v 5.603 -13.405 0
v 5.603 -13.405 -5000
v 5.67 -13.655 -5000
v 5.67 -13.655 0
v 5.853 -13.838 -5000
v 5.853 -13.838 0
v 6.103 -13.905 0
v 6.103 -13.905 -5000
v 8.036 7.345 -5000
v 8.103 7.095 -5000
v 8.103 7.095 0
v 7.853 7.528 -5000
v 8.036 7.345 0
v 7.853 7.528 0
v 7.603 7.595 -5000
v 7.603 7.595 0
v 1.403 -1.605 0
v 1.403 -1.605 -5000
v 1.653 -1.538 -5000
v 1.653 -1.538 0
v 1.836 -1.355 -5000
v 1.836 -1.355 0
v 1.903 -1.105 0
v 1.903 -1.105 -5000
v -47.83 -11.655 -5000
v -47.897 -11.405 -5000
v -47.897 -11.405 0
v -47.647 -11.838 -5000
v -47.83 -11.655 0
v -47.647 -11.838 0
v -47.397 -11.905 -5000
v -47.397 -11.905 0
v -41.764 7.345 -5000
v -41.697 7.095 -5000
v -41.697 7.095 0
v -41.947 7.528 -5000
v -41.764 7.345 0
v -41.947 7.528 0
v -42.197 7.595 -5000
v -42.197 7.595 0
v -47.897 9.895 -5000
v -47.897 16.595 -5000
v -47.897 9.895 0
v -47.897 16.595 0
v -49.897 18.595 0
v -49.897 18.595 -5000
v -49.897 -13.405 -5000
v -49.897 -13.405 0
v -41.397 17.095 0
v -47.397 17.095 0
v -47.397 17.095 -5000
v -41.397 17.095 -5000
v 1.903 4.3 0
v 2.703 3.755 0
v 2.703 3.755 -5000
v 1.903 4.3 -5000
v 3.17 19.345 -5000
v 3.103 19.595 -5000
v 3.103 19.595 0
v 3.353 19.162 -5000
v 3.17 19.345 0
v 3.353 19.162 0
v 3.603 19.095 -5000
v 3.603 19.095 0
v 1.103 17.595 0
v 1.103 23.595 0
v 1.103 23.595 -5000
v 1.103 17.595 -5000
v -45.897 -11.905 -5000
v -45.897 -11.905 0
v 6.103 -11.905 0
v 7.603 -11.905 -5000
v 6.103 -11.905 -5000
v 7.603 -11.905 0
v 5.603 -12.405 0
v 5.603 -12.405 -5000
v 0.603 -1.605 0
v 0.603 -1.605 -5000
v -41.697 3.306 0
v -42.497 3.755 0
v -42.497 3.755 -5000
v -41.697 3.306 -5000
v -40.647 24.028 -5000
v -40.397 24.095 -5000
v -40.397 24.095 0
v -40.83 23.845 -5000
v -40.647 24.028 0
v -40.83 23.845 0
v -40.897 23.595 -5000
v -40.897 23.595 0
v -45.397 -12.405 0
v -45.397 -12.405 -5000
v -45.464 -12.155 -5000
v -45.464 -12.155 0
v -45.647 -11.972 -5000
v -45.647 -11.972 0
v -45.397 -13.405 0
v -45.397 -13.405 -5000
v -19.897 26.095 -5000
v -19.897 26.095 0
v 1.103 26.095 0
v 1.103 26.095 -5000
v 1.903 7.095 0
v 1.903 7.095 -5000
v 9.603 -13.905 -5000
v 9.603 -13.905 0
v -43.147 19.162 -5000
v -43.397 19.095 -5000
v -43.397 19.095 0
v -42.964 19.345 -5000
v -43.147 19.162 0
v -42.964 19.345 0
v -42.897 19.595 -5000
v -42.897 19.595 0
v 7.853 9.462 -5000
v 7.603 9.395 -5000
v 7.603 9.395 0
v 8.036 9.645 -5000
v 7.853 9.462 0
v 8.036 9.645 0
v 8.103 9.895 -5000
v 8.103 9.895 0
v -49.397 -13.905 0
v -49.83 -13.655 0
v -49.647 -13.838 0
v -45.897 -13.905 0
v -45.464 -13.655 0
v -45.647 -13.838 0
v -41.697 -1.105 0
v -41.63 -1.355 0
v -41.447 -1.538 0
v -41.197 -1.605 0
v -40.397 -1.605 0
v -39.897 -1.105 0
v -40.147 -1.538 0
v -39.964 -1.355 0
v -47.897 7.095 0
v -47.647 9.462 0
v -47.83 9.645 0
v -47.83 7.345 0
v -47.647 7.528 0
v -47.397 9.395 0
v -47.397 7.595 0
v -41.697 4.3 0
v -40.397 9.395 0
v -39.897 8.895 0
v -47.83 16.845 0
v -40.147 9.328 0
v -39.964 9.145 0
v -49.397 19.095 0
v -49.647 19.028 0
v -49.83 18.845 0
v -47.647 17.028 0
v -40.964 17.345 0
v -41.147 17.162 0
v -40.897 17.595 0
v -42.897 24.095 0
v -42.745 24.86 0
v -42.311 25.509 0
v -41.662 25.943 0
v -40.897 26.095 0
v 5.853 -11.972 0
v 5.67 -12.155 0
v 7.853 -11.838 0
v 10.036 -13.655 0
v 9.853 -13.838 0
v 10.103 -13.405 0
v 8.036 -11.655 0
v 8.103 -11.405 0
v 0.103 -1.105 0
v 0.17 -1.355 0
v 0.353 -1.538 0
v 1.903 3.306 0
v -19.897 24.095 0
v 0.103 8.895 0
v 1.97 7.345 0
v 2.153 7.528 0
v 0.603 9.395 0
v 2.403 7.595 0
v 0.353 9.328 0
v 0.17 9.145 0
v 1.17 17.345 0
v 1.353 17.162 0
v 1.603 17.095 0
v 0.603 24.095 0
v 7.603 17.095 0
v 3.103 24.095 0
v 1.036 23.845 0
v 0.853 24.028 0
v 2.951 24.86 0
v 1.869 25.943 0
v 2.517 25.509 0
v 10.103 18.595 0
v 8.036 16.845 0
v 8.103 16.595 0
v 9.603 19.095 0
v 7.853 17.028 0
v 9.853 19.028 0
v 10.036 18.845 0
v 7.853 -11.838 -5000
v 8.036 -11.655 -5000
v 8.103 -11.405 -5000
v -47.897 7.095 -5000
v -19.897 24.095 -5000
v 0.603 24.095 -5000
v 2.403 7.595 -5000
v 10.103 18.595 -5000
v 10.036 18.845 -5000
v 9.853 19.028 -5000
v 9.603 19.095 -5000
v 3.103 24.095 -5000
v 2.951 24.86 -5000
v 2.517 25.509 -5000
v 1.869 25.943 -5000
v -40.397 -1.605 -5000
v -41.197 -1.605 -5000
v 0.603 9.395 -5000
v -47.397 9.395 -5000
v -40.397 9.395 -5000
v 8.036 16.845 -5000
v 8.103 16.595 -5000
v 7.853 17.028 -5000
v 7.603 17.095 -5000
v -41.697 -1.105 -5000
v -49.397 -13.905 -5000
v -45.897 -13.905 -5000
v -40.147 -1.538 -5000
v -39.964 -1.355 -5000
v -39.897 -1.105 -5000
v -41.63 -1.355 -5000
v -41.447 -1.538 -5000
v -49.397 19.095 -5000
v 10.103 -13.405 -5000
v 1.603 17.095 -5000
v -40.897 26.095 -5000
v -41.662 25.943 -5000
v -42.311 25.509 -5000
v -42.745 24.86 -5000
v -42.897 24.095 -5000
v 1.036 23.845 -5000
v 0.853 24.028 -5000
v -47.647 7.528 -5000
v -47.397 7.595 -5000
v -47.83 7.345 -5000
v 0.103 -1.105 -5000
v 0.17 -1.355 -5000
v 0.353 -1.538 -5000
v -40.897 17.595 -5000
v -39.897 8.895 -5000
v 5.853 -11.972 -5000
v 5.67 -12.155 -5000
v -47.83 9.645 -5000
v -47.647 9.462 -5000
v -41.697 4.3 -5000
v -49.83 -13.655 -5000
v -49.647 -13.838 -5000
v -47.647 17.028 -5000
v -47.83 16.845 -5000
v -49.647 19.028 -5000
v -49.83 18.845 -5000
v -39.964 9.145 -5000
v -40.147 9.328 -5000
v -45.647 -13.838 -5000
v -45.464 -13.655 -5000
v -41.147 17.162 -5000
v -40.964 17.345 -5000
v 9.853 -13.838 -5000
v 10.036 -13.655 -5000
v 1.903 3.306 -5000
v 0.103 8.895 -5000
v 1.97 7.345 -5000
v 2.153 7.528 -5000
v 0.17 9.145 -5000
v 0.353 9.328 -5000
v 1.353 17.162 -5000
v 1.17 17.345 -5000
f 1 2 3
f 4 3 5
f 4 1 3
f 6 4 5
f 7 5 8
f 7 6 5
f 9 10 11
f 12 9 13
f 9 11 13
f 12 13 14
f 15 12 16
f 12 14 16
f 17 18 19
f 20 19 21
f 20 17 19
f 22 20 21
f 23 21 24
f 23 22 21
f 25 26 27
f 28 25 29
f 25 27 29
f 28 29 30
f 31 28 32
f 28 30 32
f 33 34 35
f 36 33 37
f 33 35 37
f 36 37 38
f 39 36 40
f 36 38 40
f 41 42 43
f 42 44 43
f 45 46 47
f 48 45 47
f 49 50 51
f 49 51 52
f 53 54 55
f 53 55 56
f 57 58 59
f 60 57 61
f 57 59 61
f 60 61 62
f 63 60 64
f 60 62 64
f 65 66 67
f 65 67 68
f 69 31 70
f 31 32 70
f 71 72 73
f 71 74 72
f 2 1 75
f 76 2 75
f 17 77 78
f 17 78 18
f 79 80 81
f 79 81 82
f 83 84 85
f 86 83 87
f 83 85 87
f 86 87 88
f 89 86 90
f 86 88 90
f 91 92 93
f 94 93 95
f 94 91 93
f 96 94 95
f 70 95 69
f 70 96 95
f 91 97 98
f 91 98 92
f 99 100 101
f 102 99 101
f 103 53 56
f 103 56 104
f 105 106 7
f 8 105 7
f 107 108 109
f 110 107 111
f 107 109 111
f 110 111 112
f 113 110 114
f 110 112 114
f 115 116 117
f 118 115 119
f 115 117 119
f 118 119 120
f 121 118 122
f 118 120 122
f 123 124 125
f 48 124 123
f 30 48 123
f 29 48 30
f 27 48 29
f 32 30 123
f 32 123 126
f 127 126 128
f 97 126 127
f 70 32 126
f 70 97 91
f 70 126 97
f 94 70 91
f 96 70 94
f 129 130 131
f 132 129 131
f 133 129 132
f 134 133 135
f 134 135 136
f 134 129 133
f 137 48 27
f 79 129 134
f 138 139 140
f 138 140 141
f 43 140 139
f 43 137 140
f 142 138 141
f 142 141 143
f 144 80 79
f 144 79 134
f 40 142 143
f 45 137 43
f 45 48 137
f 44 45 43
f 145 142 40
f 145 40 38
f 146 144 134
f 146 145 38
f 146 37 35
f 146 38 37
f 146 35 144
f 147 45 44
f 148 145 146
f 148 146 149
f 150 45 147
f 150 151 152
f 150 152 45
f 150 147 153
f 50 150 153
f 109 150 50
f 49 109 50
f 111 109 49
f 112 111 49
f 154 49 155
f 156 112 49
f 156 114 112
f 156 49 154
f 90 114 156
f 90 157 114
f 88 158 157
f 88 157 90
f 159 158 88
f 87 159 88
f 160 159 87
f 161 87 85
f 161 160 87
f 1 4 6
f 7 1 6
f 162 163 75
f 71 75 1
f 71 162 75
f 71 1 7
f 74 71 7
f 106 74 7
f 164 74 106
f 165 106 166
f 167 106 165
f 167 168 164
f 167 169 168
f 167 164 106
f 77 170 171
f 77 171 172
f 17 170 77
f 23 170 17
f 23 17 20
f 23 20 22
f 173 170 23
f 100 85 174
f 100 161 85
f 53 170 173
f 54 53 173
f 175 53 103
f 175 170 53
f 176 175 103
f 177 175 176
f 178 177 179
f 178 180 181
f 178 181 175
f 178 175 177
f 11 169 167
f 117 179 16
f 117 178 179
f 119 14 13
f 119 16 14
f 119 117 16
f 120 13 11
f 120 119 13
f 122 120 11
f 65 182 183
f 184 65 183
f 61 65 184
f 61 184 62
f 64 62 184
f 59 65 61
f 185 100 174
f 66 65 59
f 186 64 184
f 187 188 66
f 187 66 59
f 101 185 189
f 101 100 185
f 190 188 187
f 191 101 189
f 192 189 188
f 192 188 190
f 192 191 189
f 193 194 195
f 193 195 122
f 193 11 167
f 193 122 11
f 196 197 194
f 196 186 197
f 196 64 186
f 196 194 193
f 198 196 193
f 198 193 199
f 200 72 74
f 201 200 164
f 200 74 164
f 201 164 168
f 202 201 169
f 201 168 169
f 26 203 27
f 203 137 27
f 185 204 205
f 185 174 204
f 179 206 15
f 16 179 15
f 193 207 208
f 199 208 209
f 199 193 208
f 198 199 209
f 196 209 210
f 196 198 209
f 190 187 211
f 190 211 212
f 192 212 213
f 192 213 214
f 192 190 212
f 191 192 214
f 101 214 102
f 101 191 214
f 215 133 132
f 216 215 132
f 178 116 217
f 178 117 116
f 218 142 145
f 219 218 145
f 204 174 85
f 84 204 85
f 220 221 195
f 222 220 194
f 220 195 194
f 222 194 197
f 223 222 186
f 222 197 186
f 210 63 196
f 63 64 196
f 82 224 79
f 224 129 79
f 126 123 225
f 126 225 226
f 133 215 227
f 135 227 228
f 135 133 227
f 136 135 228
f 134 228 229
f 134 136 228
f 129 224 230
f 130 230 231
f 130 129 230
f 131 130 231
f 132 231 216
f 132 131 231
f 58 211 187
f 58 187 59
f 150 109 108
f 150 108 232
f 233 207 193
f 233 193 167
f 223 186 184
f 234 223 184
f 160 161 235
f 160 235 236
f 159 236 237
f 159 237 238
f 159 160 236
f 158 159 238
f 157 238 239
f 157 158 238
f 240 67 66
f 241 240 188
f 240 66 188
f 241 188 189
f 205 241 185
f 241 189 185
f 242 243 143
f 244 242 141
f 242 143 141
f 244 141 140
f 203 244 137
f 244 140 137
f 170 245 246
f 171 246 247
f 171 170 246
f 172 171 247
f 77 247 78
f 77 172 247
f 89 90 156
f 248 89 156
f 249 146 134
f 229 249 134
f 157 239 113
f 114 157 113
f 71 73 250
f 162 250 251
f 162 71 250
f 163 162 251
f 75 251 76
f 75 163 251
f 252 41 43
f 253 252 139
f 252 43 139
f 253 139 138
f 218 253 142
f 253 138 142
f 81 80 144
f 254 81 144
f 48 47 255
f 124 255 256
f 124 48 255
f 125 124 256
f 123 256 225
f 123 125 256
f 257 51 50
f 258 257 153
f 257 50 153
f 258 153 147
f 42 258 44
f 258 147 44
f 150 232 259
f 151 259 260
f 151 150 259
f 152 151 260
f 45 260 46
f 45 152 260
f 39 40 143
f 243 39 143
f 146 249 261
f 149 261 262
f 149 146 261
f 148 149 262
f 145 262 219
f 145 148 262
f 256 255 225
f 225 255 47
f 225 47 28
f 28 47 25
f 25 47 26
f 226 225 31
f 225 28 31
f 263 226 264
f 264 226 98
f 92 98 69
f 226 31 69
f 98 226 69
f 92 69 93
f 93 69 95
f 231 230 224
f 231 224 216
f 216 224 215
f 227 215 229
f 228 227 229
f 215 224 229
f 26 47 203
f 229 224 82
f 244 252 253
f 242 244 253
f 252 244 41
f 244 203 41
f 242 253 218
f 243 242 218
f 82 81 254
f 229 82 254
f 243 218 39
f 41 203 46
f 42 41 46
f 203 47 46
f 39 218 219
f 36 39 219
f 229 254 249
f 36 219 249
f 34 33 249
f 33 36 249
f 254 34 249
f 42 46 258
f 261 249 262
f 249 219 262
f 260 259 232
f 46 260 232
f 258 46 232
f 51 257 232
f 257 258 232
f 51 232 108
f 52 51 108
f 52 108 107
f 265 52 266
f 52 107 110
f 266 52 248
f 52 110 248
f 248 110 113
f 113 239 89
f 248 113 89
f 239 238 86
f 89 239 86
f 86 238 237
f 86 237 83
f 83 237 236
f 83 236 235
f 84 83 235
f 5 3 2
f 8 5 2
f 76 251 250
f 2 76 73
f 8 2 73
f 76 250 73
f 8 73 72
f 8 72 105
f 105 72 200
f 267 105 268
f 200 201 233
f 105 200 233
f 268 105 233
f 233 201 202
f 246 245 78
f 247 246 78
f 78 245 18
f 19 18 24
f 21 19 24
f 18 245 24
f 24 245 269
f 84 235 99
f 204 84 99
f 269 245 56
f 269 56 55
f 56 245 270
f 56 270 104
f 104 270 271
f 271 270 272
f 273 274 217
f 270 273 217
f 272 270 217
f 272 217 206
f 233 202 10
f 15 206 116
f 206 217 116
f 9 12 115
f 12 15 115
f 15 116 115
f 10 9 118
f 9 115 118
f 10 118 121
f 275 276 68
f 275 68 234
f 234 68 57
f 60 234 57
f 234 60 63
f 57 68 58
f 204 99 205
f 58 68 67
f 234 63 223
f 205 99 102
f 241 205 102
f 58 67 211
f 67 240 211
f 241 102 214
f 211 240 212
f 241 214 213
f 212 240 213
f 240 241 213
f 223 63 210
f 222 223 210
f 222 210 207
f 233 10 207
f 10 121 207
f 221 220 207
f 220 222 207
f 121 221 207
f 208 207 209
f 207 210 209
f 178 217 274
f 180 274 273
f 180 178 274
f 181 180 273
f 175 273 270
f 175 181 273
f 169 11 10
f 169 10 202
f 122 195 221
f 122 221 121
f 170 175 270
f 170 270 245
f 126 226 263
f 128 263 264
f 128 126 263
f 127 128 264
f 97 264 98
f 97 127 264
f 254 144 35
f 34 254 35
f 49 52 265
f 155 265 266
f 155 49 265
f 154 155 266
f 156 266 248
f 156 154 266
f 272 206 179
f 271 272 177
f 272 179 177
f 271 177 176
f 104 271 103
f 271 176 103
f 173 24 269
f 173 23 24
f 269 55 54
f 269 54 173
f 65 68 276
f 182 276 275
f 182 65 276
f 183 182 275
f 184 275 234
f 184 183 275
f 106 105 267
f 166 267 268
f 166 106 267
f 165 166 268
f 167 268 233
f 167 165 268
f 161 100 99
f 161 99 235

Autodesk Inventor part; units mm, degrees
ref_plane "YZ Plane" through (0, 0, 0) normal (1, 0, 0) x (0, 1, 0)
ref_plane "XZ Plane" through (0, 0, 0) normal (0, 1, 0) x (-1, 0, 0)
ref_plane "XY Plane" through (0, 0, 0) normal (0, 0, 1) x (1, 0, 0)
sketch "Sketch1" plane through (0, 0, 0) normal (0, 0, 1) x (1, 0, 0)
  line L0 (-19.8968, 26.095) -> (1.1032, 26.095)
  line L1 (10.1032, 18.595) -> (10.1032, -13.405)
  line L2 (9.6032, -13.905) -> (6.1032, -13.905)
  line L3 (-19.8968, 24.095) -> (0.6032, 24.095)
  line L4 (7.6032, -11.905) -> (6.1032, -11.905)
  line L5 (3.1032, 24.095) -> (3.1032, 19.595)
  line L6 (3.6032, 19.095) -> (9.6032, 19.095)
  line L7 (-19.8968, 31.6782) -> (-19.8968, -20.1233) construction
  line L8 (1.1032, 23.595) -> (1.1032, 17.595)
  line L9 (1.1032, 17.095) -> (1.1032, 17.095)
  line L10 (7.6032, 17.095) -> (1.6032, 17.095)
  line L11 (7.6032, 9.395) -> (0.6032, 9.395)
  line L12 (0.1032, 8.895) -> (0.1032, -1.105)
  line L13 (0.6032, -1.605) -> (1.4032, -1.605)
  line L14 (2.4032, 7.595) -> (7.6032, 7.595)
  line L15 (2.7032, 3.7552) -> (1.9032, 4.2999)
  line L16 (2.7032, 3.7552) -> (1.9032, 3.306)
  line L17 (1.9032, -1.105) -> (1.9032, 3.306)
  line L18 (1.9032, 4.2999) -> (1.9032, 7.095)
  line L19 (5.6032, -13.405) -> (5.6032, -12.405)
  line L20 (8.1032, 16.595) -> (8.1032, 9.895)
  line L21 (8.1032, 7.095) -> (8.1032, -11.405)
  arc A0 (3.1032, 24.095) -> (1.1032, 26.095) centre (1.1032, 24.095) ccw
  arc A1 (1.1032, 17.595) -> (1.6032, 17.095) centre (1.6032, 17.595) ccw
  arc A2 (3.1032, 19.595) -> (3.6032, 19.095) centre (3.6032, 19.595) ccw
  arc A3 (10.1032, 18.595) -> (9.6032, 19.095) centre (9.6032, 18.595) ccw
  arc A4 (7.6032, 9.395) -> (8.1032, 9.895) centre (7.6032, 9.895) ccw
  arc A5 (8.1032, 7.095) -> (7.6032, 7.595) centre (7.6032, 7.095) ccw
  arc A6 (0.6032, 9.395) -> (0.1032, 8.895) centre (0.6032, 8.895) ccw
  arc A7 (0.1032, -1.105) -> (0.6032, -1.605) centre (0.6032, -1.105) ccw
  arc A8 (1.4032, -1.605) -> (1.9032, -1.105) centre (1.4032, -1.105) ccw
  arc A9 (2.4032, 7.595) -> (1.9032, 7.095) centre (2.4032, 7.095) ccw
  arc A10 (8.1032, 16.595) -> (7.6032, 17.095) centre (7.6032, 16.595) ccw
  arc A11 (7.6032, -11.905) -> (8.1032, -11.405) centre (7.6032, -11.405) ccw
  arc A12 (6.1032, -11.905) -> (5.6032, -12.405) centre (6.1032, -12.405) ccw
  arc A13 (5.6032, -13.405) -> (6.1032, -13.905) centre (6.1032, -13.405) ccw
  arc A14 (9.6032, -13.905) -> (10.1032, -13.405) centre (9.6032, -13.405) ccw
  arc A15 (1.1032, 23.595) -> (0.6032, 24.095) centre (0.6032, 23.595) ccw
  line L22 (-19.8968, 26.095) -> (-40.8968, 26.095)
  line L23 (-49.8968, 18.595) -> (-49.8968, -13.405)
  line L24 (-49.3968, -13.905) -> (-45.8968, -13.905)
  line L25 (-19.8968, 24.095) -> (-40.3968, 24.095)
  line L26 (-47.3968, -11.905) -> (-45.8968, -11.905)
  line L27 (-42.8968, 24.095) -> (-42.8968, 19.595)
  line L28 (-43.3968, 19.095) -> (-49.3968, 19.095)
  line L29 (-40.8968, 23.595) -> (-40.8968, 17.595)
  line L30 (-40.8968, 17.095) -> (-40.8968, 17.095)
  line L31 (-47.3968, 17.095) -> (-41.3968, 17.095)
  line L32 (-47.3968, 9.395) -> (-40.3968, 9.395)
  line L33 (-39.8968, 8.895) -> (-39.8968, -1.105)
  line L34 (-40.3968, -1.605) -> (-41.1968, -1.605)
  line L35 (-42.1968, 7.595) -> (-47.3968, 7.595)
  line L36 (-42.4968, 3.7552) -> (-41.6968, 4.2999)
  line L37 (-42.4968, 3.7552) -> (-41.6968, 3.306)
  line L38 (-41.6968, -1.105) -> (-41.6968, 3.306)
  line L39 (-41.6968, 4.2999) -> (-41.6968, 7.095)
  line L40 (-45.3968, -13.405) -> (-45.3968, -12.405)
  line L41 (-47.8968, 16.595) -> (-47.8968, 9.895)
  line L42 (-47.8968, 7.095) -> (-47.8968, -11.405)
  arc A16 (-40.8968, 26.095) -> (-42.8968, 24.095) centre (-40.8968, 24.095) ccw
  arc A17 (-41.3968, 17.095) -> (-40.8968, 17.595) centre (-41.3968, 17.595) ccw
  arc A18 (-43.3968, 19.095) -> (-42.8968, 19.595) centre (-43.3968, 19.595) ccw
  arc A19 (-49.3968, 19.095) -> (-49.8968, 18.595) centre (-49.3968, 18.595) ccw
  arc A20 (-47.8968, 9.895) -> (-47.3968, 9.395) centre (-47.3968, 9.895) ccw
  arc A21 (-47.3968, 7.595) -> (-47.8968, 7.095) centre (-47.3968, 7.095) ccw
  arc A22 (-39.8968, 8.895) -> (-40.3968, 9.395) centre (-40.3968, 8.895) ccw
  arc A23 (-40.3968, -1.605) -> (-39.8968, -1.105) centre (-40.3968, -1.105) ccw
  arc A24 (-41.6968, -1.105) -> (-41.1968, -1.605) centre (-41.1968, -1.105) ccw
  arc A25 (-41.6968, 7.095) -> (-42.1968, 7.595) centre (-42.1968, 7.095) ccw
  arc A26 (-47.3968, 17.095) -> (-47.8968, 16.595) centre (-47.3968, 16.595) ccw
  arc A27 (-47.8968, -11.405) -> (-47.3968, -11.905) centre (-47.3968, -11.405) ccw
  arc A28 (-45.3968, -12.405) -> (-45.8968, -11.905) centre (-45.8968, -12.405) ccw
  arc A29 (-45.8968, -13.905) -> (-45.3968, -13.405) centre (-45.8968, -13.405) ccw
  arc A30 (-49.8968, -13.405) -> (-49.3968, -13.905) centre (-49.3968, -13.405) ccw
  arc A31 (-40.3968, 24.095) -> (-40.8968, 23.595) centre (-40.3968, 23.595) ccw
  point P0 (0, 0)
  point P1 (6.6032, 19.095)
  point P2 (4.1032, 9.395)
  point P3 (1.0032, -1.605)
  point P4 (5.6032, -12.905)
  point P5 (7.8532, -13.905)
  point P6 (1.9032, 5.6974)
  point P7 (-39.7937, 0)
  point P8 (-46.3968, 19.095)
  point P9 (-43.8968, 9.395)
  point P10 (-40.7968, -1.605)
  point P11 (-45.3968, -12.905)
  point P12 (-47.6468, -13.905)
  point P13 (-41.6968, 5.6974)
  dimension "d4" = 7
  dimension "d5" = 7
  dimension "d6" = 2
  dimension "d7" = 2
  dimension "d9" = 2
  dimension "d11" = 7.7
  dimension "d12" = 1.8
  dimension "d14" = 11
  dimension "d16" = 4.5
  dimension "d17" = 2
  dimension "d20" = 0.5
  dimension "d22" = 40
  dimension "d23" = 1.8
  dimension "d24" = 60
extrude "Extrusion1" add sketch "Sketch1" against normal blind 5000
properties part number "HD - 402 PERFIL ALUMINO - PASAMANOS RECTANGULAR"
